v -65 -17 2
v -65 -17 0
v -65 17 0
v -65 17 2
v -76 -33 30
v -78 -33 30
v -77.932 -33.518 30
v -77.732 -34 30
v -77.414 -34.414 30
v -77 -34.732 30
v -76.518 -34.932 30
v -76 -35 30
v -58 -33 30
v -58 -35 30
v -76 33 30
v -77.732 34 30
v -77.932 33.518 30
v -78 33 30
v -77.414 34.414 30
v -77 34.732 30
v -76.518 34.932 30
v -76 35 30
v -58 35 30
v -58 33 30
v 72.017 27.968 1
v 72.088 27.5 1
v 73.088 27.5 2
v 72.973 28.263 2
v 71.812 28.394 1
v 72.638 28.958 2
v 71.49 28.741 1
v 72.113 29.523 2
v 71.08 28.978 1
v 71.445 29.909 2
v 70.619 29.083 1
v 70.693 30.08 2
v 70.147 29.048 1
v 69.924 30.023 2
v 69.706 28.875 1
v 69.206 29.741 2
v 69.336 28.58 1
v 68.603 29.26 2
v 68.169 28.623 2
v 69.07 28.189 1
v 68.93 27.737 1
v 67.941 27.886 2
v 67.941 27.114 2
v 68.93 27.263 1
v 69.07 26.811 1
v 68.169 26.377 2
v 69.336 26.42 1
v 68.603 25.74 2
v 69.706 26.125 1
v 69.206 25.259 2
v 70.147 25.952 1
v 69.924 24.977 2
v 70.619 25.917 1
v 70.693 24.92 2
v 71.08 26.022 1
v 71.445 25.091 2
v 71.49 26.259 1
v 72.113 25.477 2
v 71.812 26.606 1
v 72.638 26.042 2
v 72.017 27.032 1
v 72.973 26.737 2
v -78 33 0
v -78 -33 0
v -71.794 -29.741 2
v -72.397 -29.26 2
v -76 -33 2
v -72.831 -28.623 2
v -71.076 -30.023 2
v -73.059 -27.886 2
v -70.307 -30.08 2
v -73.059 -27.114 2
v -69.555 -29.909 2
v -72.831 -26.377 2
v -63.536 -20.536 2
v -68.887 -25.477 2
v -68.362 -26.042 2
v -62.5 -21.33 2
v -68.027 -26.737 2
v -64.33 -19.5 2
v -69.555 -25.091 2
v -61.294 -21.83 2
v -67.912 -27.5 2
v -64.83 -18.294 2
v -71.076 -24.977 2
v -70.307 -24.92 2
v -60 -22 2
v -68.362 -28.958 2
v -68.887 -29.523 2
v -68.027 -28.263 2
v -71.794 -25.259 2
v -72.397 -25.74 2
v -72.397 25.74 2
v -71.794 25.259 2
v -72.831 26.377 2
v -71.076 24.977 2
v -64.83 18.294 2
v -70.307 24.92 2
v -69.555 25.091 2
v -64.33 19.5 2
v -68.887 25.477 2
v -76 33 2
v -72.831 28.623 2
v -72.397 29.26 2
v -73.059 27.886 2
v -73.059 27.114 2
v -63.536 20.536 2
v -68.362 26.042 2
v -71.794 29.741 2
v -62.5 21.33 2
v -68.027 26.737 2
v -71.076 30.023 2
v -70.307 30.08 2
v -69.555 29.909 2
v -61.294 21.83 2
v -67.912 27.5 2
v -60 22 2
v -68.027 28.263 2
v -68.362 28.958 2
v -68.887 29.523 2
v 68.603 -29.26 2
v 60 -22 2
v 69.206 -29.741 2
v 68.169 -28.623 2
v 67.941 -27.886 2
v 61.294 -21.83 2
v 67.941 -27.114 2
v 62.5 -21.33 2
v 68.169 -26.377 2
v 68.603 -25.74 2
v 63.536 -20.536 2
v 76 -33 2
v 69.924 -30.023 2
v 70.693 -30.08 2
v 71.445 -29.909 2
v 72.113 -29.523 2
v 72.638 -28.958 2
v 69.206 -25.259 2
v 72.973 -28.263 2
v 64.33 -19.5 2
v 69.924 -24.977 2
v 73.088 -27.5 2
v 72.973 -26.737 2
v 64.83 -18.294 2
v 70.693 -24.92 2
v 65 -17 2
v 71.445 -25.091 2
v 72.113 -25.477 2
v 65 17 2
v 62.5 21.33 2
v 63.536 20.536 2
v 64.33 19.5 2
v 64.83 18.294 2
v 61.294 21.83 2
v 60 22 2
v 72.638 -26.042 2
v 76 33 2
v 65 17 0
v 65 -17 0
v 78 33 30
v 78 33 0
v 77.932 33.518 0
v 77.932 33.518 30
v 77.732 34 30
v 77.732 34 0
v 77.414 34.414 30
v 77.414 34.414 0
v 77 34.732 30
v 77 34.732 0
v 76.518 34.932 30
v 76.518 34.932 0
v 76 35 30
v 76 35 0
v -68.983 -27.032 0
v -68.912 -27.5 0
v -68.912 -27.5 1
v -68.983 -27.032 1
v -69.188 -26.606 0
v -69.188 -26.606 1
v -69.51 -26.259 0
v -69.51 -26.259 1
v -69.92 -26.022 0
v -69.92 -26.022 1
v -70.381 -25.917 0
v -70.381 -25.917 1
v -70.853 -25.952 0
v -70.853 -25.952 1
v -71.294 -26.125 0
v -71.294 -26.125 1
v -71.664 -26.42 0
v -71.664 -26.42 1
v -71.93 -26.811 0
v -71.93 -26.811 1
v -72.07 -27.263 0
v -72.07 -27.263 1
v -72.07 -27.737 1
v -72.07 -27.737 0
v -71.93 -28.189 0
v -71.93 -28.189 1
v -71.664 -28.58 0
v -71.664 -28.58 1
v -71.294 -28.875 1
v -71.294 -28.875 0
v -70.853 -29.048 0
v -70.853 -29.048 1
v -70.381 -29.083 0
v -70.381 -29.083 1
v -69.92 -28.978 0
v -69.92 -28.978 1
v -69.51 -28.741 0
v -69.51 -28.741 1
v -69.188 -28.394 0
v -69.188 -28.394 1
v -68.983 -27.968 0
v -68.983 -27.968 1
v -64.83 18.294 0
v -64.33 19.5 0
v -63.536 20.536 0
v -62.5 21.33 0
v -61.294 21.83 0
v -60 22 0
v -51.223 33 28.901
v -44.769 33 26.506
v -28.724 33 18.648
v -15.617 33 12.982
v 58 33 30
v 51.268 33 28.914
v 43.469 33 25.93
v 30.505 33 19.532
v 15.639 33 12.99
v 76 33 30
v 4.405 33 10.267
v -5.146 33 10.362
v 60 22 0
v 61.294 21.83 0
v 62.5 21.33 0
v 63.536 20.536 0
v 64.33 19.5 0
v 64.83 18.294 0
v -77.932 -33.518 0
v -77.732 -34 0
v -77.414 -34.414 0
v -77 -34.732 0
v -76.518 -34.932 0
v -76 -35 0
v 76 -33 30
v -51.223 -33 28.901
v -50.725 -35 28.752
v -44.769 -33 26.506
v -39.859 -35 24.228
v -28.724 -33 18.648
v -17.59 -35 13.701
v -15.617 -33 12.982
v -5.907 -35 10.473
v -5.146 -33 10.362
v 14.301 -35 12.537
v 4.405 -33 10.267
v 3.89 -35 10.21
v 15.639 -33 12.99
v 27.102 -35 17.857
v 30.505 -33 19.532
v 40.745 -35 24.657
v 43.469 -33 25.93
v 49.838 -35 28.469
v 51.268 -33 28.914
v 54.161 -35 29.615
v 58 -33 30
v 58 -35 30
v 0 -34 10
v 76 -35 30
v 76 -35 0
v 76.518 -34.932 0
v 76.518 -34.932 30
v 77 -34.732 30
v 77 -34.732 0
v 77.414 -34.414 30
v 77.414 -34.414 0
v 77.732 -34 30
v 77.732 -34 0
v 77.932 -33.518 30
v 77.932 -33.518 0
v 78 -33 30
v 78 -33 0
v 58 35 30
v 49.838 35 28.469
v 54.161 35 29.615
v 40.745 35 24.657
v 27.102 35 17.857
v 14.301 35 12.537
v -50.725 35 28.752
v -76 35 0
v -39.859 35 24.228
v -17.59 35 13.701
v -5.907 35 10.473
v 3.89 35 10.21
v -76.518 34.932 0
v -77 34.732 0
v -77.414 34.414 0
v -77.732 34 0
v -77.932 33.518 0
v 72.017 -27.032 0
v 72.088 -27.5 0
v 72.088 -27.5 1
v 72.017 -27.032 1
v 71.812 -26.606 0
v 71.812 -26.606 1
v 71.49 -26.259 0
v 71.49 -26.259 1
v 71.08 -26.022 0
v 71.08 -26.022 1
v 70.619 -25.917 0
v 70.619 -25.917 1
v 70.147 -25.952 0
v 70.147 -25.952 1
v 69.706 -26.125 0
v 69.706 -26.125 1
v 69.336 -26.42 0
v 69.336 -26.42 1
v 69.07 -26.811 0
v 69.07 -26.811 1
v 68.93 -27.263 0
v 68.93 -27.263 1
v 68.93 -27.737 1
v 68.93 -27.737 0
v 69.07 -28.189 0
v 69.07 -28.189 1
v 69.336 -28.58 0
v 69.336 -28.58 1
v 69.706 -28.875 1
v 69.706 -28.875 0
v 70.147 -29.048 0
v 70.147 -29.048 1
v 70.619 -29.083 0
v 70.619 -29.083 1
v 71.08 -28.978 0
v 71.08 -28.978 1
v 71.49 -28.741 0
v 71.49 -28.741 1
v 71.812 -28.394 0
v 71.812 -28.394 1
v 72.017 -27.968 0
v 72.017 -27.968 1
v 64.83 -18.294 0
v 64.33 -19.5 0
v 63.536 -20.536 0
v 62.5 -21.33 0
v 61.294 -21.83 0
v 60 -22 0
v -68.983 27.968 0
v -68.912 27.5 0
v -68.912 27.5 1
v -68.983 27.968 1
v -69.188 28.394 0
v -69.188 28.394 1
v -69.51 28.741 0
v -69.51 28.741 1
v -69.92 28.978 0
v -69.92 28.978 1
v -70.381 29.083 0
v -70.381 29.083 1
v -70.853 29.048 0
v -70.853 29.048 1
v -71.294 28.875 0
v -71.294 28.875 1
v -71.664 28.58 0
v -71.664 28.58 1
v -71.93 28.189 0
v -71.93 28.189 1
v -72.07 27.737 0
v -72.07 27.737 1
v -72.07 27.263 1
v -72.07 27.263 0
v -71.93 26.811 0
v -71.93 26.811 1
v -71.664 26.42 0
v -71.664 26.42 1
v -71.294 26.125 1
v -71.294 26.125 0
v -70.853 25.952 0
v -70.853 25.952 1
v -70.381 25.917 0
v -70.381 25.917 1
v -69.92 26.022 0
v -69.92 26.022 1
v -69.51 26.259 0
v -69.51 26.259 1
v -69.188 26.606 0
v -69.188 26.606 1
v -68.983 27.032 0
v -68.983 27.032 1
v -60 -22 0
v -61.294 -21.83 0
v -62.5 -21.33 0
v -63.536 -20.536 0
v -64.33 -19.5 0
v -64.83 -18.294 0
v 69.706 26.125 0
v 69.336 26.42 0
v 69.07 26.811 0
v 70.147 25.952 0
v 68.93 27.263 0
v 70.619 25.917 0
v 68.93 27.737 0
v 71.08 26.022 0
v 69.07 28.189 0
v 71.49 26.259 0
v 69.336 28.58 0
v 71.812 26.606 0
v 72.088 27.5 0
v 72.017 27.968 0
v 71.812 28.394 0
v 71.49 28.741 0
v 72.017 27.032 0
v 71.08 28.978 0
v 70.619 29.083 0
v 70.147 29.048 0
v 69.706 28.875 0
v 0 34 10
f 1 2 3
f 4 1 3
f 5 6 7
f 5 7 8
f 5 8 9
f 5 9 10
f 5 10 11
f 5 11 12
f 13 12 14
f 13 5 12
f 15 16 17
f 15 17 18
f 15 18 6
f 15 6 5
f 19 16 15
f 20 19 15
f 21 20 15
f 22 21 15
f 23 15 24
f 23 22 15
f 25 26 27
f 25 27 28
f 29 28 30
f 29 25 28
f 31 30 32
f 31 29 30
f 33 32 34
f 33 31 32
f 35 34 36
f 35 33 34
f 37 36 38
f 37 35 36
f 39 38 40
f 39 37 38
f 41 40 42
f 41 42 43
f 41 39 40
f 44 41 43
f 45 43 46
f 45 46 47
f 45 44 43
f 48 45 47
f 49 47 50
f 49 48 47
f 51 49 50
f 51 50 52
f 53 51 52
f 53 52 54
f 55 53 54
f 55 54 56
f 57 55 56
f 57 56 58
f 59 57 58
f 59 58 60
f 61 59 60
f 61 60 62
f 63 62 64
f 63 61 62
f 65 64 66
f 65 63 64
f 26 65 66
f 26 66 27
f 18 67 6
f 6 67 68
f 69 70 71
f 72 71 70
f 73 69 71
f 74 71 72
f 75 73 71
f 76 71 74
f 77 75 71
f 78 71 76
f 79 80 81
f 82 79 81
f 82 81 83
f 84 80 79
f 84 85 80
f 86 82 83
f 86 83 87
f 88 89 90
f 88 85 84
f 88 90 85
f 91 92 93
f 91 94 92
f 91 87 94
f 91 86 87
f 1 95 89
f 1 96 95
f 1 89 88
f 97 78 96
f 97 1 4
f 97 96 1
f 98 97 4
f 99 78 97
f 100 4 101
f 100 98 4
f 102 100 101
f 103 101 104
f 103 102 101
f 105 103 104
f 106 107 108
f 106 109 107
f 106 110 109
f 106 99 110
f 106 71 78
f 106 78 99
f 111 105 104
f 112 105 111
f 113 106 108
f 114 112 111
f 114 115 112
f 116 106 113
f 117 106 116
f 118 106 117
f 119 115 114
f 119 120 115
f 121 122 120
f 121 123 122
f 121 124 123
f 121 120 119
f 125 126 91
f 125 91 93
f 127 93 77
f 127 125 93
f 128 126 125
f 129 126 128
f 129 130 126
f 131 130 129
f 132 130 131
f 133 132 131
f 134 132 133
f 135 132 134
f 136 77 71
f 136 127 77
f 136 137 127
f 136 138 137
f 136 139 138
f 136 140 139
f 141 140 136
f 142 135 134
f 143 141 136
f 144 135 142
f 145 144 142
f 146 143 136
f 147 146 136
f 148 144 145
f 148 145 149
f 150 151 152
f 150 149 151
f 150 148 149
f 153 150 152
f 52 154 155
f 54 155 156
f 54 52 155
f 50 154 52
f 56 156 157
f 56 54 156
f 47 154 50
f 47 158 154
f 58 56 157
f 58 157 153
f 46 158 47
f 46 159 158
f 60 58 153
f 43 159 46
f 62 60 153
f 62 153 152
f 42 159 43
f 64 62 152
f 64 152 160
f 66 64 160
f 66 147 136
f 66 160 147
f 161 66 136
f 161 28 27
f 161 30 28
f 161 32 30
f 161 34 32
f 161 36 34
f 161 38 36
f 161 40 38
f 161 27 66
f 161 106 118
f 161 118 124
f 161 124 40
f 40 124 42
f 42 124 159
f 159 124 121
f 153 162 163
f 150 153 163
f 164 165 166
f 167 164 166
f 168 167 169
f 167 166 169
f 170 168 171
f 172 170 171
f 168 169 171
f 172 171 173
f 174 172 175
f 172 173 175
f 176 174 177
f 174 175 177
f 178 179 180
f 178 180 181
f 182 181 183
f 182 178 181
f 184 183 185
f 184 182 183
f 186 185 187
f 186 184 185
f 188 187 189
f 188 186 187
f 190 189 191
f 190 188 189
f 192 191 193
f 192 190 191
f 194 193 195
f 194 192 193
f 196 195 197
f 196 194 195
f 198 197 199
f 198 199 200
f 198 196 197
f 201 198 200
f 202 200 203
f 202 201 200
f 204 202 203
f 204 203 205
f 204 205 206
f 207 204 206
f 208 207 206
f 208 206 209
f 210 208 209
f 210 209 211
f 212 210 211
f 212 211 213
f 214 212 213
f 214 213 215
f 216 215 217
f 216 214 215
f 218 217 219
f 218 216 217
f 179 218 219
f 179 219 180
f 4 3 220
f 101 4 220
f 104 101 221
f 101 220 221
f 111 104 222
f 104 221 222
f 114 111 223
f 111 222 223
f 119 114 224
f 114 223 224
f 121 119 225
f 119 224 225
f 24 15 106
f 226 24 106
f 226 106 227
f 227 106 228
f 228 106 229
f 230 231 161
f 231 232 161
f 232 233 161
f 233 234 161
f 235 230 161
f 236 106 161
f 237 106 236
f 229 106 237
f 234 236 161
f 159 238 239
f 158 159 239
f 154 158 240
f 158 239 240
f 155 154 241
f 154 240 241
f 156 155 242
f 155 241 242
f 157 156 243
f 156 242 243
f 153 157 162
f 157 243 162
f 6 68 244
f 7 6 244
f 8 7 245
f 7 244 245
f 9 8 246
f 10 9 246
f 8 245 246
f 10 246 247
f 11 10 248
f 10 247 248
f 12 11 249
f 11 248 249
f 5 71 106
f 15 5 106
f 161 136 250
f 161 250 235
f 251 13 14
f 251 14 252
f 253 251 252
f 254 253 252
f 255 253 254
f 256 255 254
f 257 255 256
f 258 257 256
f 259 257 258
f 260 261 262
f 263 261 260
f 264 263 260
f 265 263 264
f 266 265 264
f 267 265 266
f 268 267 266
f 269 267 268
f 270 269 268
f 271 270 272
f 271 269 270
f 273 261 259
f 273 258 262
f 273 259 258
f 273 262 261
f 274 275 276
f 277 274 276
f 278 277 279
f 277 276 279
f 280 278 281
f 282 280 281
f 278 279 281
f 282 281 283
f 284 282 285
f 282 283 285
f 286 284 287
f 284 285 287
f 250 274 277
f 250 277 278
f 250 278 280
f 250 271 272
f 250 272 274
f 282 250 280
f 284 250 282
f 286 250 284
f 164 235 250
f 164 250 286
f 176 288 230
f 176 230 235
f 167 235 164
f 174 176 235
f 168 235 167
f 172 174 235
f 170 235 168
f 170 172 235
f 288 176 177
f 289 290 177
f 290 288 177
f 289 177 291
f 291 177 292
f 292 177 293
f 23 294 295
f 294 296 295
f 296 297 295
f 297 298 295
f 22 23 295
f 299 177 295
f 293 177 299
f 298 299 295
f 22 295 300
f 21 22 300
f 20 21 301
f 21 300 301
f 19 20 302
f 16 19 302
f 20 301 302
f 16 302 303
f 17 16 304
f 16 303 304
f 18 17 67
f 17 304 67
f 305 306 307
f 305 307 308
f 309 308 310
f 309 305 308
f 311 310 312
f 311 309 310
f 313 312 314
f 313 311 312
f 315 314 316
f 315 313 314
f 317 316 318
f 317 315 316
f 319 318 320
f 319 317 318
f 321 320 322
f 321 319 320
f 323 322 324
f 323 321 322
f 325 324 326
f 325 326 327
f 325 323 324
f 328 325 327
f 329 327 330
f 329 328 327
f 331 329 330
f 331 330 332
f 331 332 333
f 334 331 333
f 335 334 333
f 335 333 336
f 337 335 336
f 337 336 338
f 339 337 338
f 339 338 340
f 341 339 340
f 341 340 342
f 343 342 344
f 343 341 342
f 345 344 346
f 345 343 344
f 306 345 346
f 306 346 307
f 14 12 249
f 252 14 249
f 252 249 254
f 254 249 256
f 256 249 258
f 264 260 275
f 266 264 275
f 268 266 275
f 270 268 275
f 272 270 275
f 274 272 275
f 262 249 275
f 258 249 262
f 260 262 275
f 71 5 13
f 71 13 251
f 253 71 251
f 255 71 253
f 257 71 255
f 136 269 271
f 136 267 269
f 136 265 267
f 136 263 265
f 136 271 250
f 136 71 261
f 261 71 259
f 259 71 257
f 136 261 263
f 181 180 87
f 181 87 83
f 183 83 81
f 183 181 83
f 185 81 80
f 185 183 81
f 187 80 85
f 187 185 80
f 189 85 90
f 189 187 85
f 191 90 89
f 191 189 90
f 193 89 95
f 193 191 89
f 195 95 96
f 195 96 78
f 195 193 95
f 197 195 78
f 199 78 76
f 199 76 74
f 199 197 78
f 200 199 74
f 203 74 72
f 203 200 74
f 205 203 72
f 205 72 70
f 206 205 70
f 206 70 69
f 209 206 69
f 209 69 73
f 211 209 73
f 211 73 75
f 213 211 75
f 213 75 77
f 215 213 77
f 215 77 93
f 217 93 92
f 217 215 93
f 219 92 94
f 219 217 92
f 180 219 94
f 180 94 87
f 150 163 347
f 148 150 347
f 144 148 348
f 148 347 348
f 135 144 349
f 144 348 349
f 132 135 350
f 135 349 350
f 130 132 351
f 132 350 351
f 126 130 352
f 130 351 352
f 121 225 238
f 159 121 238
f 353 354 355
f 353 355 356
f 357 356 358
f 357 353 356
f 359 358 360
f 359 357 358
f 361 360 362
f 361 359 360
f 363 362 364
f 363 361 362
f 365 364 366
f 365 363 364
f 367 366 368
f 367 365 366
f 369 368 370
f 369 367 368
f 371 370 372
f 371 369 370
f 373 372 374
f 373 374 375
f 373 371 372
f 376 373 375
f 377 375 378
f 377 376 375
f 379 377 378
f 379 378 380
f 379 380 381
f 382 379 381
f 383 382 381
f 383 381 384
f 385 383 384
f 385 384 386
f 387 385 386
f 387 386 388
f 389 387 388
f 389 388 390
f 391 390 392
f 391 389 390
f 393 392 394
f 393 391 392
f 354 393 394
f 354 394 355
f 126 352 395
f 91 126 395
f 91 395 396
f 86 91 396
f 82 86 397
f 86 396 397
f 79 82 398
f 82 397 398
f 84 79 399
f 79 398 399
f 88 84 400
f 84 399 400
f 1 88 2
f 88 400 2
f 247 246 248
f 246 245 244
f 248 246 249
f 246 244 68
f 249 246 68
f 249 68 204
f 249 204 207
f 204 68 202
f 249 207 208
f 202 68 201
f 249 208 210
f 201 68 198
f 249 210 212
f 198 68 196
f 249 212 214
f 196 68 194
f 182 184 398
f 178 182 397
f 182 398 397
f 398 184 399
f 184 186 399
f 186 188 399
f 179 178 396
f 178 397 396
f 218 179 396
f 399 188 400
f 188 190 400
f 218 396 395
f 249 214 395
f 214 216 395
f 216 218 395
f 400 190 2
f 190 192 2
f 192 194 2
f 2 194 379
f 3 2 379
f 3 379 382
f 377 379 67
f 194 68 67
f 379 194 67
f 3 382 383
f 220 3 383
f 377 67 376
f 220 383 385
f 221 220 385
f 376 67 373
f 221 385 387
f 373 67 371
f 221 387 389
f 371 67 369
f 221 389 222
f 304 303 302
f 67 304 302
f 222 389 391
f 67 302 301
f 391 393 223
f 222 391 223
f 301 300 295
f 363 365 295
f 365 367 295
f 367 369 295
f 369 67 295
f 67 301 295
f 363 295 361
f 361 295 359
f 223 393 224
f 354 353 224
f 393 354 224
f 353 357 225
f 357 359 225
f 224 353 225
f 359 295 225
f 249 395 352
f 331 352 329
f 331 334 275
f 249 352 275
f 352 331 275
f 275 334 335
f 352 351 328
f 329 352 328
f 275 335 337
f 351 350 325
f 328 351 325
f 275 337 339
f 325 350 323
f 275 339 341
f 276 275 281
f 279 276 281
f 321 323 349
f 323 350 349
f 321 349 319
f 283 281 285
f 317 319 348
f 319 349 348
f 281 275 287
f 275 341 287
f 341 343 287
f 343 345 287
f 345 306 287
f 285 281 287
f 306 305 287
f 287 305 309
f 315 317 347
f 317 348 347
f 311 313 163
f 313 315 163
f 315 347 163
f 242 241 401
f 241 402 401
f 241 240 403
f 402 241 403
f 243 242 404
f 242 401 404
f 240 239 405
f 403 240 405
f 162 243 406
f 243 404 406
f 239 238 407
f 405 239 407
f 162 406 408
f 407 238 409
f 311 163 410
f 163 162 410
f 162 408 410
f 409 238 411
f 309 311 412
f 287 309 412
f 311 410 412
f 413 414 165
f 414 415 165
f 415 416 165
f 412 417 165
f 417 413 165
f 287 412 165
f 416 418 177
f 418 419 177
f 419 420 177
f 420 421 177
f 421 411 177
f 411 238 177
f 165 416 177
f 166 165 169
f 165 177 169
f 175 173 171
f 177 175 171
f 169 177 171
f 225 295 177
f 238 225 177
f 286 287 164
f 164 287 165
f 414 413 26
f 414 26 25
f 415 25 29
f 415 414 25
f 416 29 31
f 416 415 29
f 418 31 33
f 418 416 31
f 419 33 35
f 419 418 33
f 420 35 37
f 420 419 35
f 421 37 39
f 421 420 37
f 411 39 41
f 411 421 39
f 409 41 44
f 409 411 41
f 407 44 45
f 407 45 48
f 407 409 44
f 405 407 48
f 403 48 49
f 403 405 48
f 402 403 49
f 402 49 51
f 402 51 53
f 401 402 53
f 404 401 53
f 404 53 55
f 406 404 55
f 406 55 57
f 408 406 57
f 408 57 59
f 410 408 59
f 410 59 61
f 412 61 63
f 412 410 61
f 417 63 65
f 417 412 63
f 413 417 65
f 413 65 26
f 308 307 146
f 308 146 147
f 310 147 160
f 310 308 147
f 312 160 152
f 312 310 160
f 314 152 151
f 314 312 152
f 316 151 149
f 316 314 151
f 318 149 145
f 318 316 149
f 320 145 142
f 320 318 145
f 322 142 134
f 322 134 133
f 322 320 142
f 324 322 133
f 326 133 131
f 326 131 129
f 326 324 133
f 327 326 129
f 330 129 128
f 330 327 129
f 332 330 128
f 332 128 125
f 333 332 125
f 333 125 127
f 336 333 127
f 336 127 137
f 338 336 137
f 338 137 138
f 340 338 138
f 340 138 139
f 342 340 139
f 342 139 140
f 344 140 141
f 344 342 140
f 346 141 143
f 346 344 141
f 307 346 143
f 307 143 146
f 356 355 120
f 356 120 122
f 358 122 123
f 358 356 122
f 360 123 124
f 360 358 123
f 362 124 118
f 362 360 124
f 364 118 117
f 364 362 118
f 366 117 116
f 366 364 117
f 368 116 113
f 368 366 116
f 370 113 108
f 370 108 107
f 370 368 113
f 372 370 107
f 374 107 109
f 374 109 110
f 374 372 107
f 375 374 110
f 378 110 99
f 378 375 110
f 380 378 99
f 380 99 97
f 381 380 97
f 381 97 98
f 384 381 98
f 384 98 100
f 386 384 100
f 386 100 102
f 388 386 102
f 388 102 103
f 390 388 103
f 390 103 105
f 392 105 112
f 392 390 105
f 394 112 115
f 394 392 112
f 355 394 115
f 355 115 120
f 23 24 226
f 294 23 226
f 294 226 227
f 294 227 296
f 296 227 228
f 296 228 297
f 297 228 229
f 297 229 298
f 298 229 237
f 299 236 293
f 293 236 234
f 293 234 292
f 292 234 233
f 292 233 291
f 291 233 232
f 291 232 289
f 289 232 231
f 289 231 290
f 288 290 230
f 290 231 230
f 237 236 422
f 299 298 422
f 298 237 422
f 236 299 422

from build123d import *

# Parameters (mm, degrees)
F1_W          = 152
F1_H          = 66
F2_DEPTH      = 30
F1_R          = 1.5875
F3_DEPTH      = 2
F4_SIZE       = 1
F6_DEPTH      = 35
F6_DEPTH_BACK = 35


with BuildPart() as f2:
    # F1 (on Top) → F2 (new body)
    with BuildSketch(Plane.XY):
        with BuildLine():
            ThreePointArc((78, 33), (77.4142135624, 34.4142135624), (76, 35))
            Line((76, 35), (-76, 35))
            ThreePointArc((-76, 35), (-77.4142135624, 34.4142135624), (-78, 33))
            Line((-78, 33), (-78, -33))
            ThreePointArc((-78, -33), (-77.4142135624, -34.4142135624), (-76, -35))
            Line((-76, -35), (76, -35))
            ThreePointArc((76, -35), (77.4142135624, -34.4142135624), (78, -33))
            Line((78, -33), (78, 33))
        make_face()
        Rectangle(F1_W, F1_H, mode=Mode.SUBTRACT)
    extrude(amount=F2_DEPTH)

    # F1 (on Top) → F3 (join)
    with BuildSketch(Plane.XY):
        with BuildLine():
            ThreePointArc((78, 33), (77.4142135624, 34.4142135624), (76, 35))
            Line((76, 35), (-76, 35))
            ThreePointArc((-76, 35), (-77.4142135624, 34.4142135624), (-78, 33))
            Line((-78, 33), (-78, -33))
            ThreePointArc((-78, -33), (-77.4142135624, -34.4142135624), (-76, -35))
            Line((-76, -35), (76, -35))
            ThreePointArc((76, -35), (77.4142135624, -34.4142135624), (78, -33))
            Line((78, -33), (78, 33))
        make_face()
        Rectangle(F1_W, F1_H, mode=Mode.SUBTRACT)
        Rectangle(F1_W, F1_H)
        with Locations((-70.5, -27.5)):
            Circle(F1_R, mode=Mode.SUBTRACT)
        with Locations((70.5, -27.5)):
            Circle(F1_R, mode=Mode.SUBTRACT)
        with Locations((-70.5, 27.5)):
            Circle(F1_R, mode=Mode.SUBTRACT)
        with BuildLine():
            Line((-60, 22), (60, 22))
            ThreePointArc((60, 22), (63.5355339059, 20.5355339059), (65, 17))
            Line((65, 17), (65, -17))
            ThreePointArc((65, -17), (63.5355339059, -20.5355339059), (60, -22))
            Line((60, -22), (-60, -22))
            ThreePointArc((-60, -22), (-63.5355339059, -20.5355339059), (-65, -17))
            Line((-65, -17), (-65, 17))
            ThreePointArc((-65, 17), (-63.5355339059, 20.5355339059), (-60, 22))
        make_face(mode=Mode.SUBTRACT)
        with Locations((70.5, 27.5)):
            Circle(F1_R, mode=Mode.SUBTRACT)
    extrude(amount=F3_DEPTH)

    # F4
    f4_edges = [f2.edges().sort_by_distance(p)[0] for p in [
        (-72.0875, 27.5, 2),
        (68.9125, 27.5, 2),
        (68.9125, -27.5, 2),
        (-72.0875, -27.5, 2),
    ]]
    chamfer(f4_edges, length=F4_SIZE)

    # F5 (on Front) → F6 (cut, two sides)
    with BuildSketch(Plane.XZ) as f6_sk:
        with BuildLine():
            add(Edge.make_bspline(
                [(-58, 30), (-43, 30), (0, -10), (43, 30), (58, 30)],
                knots=[0, 0, 0, 0, 0.5, 1, 1, 1, 1], degree=3))
            Line((58, 30), (-58, 30))
        make_face()
    extrude(amount=-F6_DEPTH, mode=Mode.SUBTRACT)
    extrude(f6_sk.sketch, amount=F6_DEPTH_BACK, mode=Mode.SUBTRACT)


solid = f2.part
